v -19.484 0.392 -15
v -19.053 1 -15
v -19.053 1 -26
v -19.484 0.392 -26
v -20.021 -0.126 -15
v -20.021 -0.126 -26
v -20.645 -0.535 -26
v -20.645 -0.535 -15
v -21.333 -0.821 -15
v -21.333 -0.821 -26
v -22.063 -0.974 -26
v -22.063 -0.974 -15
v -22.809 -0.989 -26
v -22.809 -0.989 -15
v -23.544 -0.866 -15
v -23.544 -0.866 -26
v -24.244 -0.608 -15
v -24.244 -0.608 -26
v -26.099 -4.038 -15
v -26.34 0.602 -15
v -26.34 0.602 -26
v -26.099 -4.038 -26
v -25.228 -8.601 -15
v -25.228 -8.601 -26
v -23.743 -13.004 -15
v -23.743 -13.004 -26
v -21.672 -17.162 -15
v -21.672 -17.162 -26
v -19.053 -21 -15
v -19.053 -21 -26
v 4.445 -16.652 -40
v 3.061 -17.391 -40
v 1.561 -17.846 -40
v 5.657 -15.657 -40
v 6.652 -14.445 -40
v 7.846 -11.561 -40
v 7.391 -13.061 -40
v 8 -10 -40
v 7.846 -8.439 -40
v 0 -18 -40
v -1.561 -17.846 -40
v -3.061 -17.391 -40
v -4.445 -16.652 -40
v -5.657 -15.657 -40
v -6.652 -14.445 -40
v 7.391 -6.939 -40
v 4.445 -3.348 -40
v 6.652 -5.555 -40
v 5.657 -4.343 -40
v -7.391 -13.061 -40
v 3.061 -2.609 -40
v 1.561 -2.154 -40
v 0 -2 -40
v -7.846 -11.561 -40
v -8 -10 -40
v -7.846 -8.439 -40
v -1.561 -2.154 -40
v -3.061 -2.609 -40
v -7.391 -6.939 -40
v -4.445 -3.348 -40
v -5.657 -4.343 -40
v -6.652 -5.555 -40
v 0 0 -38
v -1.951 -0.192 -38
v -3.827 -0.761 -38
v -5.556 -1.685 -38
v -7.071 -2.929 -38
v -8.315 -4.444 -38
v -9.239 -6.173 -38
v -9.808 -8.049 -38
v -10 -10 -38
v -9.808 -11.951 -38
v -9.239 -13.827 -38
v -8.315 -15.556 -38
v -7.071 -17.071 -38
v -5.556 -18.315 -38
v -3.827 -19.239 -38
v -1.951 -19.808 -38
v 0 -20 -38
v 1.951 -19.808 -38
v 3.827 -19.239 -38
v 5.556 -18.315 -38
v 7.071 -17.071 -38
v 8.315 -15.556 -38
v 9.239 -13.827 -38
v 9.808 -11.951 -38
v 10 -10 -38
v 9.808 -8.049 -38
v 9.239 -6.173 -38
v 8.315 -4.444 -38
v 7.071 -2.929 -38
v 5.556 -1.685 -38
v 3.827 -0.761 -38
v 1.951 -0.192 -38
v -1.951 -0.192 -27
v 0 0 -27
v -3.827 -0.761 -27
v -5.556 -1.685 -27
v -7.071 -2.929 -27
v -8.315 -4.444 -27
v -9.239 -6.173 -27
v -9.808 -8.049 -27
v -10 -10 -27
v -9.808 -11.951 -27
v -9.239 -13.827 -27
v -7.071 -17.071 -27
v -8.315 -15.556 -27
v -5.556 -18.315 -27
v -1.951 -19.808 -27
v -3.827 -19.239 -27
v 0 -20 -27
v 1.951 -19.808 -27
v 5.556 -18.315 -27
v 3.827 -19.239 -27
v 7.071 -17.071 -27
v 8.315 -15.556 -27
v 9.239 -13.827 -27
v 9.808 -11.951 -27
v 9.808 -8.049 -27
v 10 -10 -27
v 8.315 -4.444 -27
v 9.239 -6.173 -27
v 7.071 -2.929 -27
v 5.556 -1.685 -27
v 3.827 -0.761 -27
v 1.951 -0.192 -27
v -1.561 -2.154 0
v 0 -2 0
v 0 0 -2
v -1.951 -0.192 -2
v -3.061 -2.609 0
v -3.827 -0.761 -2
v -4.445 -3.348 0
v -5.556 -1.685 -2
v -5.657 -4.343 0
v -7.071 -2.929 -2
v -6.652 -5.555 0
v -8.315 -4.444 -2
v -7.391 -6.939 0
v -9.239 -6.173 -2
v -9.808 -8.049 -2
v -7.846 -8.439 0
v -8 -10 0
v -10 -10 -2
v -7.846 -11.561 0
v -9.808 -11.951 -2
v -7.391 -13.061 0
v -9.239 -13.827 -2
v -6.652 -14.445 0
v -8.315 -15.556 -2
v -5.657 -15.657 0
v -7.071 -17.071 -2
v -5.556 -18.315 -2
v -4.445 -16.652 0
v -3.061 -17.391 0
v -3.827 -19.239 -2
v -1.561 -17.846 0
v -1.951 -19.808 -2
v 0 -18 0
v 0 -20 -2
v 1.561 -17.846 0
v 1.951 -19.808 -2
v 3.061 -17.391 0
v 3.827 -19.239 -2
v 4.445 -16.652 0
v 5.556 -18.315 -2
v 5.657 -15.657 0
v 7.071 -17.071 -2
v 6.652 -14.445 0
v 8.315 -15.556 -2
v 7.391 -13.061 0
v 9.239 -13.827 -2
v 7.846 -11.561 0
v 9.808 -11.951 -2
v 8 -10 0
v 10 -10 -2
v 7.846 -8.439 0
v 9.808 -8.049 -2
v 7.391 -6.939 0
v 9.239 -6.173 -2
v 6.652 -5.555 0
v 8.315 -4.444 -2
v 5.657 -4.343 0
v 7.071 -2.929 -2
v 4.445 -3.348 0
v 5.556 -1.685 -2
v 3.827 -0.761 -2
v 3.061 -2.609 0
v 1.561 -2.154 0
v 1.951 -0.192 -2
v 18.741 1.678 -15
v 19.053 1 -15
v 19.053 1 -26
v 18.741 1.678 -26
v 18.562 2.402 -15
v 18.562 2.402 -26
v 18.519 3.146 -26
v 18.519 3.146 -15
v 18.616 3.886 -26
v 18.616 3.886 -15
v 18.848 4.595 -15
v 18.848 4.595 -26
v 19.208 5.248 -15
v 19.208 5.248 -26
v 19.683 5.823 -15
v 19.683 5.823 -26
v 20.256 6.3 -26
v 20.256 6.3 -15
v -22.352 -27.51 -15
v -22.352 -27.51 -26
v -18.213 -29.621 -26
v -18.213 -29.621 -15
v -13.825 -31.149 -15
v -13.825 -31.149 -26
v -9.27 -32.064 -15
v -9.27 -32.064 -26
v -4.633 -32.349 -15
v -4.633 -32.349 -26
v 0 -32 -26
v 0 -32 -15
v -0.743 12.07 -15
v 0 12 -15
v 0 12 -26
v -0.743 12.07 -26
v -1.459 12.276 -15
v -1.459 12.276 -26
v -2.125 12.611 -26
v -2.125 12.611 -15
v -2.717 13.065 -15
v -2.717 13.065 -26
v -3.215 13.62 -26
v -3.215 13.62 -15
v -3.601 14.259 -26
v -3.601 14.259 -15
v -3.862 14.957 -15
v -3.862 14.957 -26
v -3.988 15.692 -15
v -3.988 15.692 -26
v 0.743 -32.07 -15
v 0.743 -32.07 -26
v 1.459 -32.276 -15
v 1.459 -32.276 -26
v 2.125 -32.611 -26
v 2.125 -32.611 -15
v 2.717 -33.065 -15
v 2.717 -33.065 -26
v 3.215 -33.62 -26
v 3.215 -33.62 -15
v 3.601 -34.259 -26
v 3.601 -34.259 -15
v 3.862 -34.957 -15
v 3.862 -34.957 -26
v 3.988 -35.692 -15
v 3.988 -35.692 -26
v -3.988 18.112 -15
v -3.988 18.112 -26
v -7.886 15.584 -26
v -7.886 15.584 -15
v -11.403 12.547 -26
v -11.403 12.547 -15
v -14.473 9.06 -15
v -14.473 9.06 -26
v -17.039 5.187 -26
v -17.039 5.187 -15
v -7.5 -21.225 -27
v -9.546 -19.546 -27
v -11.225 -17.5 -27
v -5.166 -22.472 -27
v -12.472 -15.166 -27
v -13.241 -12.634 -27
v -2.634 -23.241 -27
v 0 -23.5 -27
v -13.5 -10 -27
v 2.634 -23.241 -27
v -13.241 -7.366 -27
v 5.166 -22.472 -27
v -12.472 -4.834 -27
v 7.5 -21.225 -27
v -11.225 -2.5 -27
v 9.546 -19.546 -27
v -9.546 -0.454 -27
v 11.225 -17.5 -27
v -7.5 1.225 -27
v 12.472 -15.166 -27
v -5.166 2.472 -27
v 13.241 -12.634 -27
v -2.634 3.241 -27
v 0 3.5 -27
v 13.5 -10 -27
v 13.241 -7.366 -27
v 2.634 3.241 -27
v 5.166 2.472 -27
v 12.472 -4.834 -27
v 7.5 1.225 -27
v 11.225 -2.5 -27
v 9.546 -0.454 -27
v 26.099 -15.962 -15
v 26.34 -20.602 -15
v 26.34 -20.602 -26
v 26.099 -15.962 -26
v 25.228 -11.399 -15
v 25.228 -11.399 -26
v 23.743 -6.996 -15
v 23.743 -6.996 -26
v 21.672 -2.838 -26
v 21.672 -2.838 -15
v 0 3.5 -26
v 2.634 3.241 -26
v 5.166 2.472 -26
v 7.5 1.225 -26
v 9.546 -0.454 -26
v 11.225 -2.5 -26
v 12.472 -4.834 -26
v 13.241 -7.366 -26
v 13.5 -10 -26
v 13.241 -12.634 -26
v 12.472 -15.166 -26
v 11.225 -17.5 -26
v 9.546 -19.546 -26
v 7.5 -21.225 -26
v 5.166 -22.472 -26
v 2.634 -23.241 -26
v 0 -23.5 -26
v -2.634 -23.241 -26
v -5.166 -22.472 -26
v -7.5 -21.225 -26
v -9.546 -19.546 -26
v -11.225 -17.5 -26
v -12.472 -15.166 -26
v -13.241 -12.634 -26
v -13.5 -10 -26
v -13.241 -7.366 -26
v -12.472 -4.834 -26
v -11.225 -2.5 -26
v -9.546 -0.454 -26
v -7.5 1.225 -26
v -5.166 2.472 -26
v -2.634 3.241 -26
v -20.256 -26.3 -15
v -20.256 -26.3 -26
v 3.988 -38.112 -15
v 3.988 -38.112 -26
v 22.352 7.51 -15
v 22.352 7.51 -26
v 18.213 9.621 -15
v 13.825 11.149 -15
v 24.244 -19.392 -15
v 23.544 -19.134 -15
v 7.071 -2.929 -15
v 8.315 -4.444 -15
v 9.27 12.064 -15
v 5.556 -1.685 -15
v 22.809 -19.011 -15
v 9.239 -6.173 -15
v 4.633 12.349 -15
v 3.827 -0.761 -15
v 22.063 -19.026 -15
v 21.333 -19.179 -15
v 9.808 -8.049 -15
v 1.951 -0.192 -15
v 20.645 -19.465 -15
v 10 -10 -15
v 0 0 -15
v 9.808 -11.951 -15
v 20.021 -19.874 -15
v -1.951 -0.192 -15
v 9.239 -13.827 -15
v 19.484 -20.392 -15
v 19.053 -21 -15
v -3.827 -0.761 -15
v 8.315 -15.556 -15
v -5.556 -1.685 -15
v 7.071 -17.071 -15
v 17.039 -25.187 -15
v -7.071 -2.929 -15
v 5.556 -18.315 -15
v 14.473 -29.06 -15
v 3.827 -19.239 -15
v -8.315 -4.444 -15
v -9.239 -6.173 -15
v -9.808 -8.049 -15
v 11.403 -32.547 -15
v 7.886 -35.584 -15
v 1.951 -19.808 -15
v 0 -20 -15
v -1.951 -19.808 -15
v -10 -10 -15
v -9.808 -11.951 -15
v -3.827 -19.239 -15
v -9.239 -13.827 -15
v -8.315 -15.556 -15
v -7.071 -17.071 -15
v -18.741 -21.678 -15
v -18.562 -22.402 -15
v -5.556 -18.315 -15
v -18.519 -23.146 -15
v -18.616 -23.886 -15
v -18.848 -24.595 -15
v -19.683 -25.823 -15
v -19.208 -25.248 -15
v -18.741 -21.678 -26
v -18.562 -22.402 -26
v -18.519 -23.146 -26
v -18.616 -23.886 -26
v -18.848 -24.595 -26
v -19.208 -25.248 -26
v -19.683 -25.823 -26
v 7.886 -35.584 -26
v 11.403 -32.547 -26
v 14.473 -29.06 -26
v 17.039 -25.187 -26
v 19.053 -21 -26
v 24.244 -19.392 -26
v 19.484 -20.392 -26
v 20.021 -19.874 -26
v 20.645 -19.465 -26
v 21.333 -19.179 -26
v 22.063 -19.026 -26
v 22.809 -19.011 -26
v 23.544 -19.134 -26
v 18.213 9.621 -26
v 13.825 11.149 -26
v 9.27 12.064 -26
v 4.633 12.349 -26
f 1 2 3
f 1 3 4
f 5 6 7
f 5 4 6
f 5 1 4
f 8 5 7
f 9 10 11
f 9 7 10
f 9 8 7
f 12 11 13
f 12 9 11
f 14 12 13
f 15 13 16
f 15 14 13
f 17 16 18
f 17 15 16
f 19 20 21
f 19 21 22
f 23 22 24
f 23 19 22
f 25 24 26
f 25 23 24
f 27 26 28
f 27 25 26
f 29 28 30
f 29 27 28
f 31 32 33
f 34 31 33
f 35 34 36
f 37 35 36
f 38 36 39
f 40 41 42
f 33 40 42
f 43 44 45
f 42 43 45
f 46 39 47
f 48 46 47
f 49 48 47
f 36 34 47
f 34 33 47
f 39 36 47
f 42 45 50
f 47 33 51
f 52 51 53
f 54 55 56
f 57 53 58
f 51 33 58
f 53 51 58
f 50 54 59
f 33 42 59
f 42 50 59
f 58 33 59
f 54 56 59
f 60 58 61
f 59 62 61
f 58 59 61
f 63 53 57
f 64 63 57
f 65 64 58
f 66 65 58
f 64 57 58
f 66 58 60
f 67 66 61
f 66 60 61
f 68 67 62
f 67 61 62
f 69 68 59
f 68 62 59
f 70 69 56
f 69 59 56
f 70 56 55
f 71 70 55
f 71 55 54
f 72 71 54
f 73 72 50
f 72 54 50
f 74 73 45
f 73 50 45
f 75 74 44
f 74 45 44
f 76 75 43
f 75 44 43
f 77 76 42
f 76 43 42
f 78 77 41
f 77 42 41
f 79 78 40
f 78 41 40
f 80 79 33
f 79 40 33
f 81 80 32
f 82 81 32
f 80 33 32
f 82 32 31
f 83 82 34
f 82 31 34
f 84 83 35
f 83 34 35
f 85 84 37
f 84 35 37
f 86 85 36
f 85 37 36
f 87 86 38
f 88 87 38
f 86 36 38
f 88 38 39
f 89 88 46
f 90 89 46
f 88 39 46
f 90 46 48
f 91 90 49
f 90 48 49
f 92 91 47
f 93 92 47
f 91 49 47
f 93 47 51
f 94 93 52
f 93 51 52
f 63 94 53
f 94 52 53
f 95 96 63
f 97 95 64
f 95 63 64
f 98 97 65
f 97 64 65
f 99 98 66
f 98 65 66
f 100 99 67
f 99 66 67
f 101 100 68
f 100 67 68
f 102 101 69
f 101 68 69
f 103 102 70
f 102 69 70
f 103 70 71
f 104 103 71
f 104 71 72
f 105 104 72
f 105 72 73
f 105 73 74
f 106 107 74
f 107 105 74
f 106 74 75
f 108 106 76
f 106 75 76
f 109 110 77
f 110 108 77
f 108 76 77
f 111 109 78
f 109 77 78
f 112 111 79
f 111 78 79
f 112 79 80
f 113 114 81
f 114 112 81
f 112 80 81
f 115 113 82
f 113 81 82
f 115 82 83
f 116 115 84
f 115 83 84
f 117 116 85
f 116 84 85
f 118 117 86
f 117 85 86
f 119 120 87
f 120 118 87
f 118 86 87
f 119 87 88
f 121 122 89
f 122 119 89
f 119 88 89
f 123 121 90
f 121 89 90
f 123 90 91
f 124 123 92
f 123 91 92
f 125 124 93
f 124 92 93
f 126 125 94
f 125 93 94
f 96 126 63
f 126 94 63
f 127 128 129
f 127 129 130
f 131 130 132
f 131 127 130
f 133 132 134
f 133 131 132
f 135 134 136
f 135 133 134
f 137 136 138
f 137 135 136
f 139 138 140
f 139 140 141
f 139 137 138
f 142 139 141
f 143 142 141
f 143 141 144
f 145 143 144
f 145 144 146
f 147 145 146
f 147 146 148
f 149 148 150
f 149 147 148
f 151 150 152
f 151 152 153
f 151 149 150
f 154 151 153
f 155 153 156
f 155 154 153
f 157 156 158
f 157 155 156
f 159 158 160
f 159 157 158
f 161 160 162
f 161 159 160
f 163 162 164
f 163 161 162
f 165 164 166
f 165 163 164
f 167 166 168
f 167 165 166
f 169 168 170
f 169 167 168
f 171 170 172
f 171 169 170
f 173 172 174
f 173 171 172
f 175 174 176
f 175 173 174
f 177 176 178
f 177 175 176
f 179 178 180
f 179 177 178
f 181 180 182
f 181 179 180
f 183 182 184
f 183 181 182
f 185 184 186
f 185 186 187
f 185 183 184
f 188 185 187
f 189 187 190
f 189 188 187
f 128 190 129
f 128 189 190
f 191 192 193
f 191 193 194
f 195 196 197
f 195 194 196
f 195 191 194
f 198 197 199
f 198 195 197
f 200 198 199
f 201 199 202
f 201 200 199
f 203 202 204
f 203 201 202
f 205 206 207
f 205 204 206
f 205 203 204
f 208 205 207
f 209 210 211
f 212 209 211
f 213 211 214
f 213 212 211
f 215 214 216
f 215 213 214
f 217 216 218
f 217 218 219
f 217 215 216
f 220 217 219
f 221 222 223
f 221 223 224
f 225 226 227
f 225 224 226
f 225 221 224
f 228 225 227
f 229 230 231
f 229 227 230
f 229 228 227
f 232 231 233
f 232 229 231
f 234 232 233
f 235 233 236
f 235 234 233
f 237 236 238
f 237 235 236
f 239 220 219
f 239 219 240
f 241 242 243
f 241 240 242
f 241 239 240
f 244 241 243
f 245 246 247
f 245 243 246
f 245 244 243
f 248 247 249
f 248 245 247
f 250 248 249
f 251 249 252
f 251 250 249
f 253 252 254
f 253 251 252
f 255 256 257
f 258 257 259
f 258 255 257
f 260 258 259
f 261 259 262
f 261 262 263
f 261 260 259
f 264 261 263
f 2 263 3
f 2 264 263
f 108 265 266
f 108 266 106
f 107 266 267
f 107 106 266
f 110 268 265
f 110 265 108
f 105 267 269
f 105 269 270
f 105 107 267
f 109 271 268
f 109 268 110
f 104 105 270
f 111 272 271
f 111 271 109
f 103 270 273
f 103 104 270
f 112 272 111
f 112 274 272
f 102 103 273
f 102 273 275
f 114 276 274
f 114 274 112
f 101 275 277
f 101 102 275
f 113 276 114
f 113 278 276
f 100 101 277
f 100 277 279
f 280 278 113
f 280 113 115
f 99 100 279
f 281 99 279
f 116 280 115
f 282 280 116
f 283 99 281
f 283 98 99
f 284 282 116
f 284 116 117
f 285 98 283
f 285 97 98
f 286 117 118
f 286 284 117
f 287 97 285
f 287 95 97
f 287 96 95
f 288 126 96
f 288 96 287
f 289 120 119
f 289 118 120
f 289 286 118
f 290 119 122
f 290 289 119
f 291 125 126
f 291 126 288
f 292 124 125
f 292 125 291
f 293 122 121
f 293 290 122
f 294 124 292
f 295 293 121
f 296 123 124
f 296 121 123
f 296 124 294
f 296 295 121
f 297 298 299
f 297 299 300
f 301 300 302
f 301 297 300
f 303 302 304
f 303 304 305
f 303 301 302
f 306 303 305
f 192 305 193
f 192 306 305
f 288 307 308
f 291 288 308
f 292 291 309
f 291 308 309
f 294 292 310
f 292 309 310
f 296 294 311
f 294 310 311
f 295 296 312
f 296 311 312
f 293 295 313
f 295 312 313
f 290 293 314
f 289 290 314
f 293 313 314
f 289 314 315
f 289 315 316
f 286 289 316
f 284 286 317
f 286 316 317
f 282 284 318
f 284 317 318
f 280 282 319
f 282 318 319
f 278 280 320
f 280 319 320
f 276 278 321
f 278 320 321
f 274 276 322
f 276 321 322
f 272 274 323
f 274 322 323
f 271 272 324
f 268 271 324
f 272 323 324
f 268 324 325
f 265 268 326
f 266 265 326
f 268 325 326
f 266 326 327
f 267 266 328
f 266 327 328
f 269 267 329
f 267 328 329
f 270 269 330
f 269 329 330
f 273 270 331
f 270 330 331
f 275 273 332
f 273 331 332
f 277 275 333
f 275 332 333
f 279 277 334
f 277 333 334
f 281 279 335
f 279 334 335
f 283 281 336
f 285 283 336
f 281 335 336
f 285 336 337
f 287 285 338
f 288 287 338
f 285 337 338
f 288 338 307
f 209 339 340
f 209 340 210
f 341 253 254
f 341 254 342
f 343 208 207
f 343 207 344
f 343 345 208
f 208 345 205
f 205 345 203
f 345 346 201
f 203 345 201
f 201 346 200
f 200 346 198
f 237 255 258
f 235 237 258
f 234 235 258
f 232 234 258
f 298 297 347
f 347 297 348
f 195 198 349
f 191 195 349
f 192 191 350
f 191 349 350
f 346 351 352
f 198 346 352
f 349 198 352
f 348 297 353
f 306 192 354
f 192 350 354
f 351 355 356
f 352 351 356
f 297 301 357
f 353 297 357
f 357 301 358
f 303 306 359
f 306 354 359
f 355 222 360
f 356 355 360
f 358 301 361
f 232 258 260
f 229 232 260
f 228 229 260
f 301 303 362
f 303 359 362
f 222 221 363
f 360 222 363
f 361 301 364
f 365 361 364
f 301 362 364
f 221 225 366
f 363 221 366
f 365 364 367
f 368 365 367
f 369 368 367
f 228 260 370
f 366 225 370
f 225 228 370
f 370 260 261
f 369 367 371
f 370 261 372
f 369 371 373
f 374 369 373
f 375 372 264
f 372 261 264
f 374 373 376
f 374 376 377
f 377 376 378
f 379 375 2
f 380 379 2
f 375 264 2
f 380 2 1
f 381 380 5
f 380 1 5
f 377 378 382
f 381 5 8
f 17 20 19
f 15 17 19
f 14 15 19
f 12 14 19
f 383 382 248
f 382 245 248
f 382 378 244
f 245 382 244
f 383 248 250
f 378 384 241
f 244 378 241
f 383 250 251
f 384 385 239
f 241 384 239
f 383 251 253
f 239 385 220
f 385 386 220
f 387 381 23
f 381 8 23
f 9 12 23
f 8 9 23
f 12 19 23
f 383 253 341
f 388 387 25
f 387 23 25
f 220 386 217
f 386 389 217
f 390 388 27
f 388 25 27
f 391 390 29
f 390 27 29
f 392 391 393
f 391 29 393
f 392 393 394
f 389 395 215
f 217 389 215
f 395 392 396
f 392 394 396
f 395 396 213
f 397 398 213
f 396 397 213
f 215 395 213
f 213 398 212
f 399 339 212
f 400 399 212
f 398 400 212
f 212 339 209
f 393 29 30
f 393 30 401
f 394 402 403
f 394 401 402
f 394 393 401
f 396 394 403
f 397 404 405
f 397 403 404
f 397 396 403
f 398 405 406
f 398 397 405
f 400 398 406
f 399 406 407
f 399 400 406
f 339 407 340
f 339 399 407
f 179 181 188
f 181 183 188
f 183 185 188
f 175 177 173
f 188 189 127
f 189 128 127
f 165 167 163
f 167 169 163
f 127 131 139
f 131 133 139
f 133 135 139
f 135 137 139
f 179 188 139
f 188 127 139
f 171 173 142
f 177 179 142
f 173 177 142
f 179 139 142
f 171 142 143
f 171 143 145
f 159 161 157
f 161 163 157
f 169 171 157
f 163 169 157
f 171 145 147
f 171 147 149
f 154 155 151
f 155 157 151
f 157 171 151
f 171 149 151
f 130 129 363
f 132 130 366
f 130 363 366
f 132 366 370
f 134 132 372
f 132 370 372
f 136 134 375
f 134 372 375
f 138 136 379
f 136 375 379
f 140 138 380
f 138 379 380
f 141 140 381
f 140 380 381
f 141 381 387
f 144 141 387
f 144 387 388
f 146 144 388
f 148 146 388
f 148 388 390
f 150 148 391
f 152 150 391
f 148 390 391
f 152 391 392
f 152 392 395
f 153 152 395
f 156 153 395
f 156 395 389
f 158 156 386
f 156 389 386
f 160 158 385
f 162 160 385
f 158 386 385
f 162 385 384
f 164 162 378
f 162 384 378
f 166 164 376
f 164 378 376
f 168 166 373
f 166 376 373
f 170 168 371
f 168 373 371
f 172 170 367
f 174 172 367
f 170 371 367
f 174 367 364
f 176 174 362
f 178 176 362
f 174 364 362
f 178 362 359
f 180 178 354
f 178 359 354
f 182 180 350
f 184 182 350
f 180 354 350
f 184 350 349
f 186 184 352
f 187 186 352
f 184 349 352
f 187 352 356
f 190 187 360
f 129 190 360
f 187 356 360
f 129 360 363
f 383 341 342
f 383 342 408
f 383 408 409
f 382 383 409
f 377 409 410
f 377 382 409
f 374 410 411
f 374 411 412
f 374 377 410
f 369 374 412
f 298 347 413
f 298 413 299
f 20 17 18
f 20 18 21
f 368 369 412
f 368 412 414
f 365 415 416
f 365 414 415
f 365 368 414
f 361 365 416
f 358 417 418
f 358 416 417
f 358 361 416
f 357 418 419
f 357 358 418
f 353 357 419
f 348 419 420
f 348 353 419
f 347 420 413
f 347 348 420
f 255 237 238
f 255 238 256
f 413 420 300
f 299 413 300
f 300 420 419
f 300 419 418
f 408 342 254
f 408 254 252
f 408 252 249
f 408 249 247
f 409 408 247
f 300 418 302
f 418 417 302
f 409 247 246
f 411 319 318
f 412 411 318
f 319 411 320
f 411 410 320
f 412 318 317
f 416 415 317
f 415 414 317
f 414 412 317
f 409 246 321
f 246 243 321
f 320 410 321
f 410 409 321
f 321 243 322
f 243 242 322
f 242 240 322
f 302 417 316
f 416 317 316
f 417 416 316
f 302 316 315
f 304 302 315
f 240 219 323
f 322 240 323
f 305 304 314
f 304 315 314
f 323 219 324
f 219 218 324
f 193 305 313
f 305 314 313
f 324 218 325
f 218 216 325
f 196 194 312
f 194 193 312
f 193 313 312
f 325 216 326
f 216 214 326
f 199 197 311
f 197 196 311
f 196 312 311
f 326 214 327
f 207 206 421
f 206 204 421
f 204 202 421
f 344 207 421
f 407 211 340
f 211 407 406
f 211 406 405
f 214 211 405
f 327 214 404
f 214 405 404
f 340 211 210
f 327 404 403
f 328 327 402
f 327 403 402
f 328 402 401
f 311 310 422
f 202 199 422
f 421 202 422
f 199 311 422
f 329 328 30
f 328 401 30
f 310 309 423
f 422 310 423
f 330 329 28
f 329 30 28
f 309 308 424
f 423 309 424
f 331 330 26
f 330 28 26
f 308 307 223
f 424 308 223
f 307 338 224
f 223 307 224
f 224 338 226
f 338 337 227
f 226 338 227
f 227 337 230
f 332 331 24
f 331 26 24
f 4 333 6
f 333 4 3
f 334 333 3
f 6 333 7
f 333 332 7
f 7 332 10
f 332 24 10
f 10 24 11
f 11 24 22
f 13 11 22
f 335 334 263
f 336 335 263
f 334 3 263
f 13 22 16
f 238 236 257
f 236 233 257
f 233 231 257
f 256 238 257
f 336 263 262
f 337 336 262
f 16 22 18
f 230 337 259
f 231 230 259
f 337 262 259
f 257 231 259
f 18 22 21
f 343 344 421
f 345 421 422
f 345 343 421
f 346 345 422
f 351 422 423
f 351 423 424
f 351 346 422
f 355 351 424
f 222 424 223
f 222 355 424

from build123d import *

# Parameters (mm, degrees)
SKETCH_4_R               = 13.5
EXTRUDE_1_DEPTH          = 1
CHAMFER_1_SIZE           = 2
CUT_EXTRUDE_1_DEPTH      = 65.031242374
PATTERN_CIRCULAR_1_COUNT = 6


with BuildPart() as part:
    # 草圖3 → 旋轉1 (revolve)
    with BuildSketch(Plane(origin=(0, 0, 0), x_dir=(0, 0, -1), z_dir=(1, 0, 0))):
        Polygon((0, 0), (15, 0), (15, 20), (26, 20), (26, 0), (40, 0), (40, -10), (0, -10), align=None)
    revolve(axis=Axis((0, -10, -40), (0, 0, 1)))

    # 草圖4 → 填料-伸長1 (add)
    with BuildSketch(Plane(origin=(0, 0, -26), x_dir=(-1, 0, 0), z_dir=(0, 0, -1))):
        with Locations(Location((0, -10, 0), (0, 0, 90))):
            Circle(SKETCH_4_R)
    extrude(amount=EXTRUDE_1_DEPTH)

    # 導角1
    chamfer_1_edges = [part.edges().sort_by_distance(p)[0] for p in [
        (0, -20, -40),
        (0, -20, 0),
    ]]
    chamfer(chamfer_1_edges, length=CHAMFER_1_SIZE)

    # 草圖1 → 除料-伸長1 (cut, through all)
    with BuildSketch(Plane.XY):
        with BuildLine():
            Line((-3.988148122, 15.692307692), (-3.988148122, 19.733729577))
            ThreePointArc((-3.988148122, 19.733729577), (13.235915698, 16.922305541), (25.980762114, 5))
            ThreePointArc((25.980762114, 5), (13.7123081, 11.179459253), (0, 12))
            ThreePointArc((0, 12), (-2.717464882, 13.064802457), (-3.988148122, 15.692307692))
        make_face()
    cut_extrude_1 = extrude(amount=-CUT_EXTRUDE_1_DEPTH, mode=Mode.SUBTRACT)

    # 環狀複製排列1: 除料-伸長1 ×6 about axis
    pattern_circular_1_axis = Axis((0, -10, 0), (0, 0, 1))
    for i in range(1, PATTERN_CIRCULAR_1_COUNT):
        add(cut_extrude_1.rotate(pattern_circular_1_axis, i * 360 / PATTERN_CIRCULAR_1_COUNT), mode=Mode.SUBTRACT)


solid = part.part
